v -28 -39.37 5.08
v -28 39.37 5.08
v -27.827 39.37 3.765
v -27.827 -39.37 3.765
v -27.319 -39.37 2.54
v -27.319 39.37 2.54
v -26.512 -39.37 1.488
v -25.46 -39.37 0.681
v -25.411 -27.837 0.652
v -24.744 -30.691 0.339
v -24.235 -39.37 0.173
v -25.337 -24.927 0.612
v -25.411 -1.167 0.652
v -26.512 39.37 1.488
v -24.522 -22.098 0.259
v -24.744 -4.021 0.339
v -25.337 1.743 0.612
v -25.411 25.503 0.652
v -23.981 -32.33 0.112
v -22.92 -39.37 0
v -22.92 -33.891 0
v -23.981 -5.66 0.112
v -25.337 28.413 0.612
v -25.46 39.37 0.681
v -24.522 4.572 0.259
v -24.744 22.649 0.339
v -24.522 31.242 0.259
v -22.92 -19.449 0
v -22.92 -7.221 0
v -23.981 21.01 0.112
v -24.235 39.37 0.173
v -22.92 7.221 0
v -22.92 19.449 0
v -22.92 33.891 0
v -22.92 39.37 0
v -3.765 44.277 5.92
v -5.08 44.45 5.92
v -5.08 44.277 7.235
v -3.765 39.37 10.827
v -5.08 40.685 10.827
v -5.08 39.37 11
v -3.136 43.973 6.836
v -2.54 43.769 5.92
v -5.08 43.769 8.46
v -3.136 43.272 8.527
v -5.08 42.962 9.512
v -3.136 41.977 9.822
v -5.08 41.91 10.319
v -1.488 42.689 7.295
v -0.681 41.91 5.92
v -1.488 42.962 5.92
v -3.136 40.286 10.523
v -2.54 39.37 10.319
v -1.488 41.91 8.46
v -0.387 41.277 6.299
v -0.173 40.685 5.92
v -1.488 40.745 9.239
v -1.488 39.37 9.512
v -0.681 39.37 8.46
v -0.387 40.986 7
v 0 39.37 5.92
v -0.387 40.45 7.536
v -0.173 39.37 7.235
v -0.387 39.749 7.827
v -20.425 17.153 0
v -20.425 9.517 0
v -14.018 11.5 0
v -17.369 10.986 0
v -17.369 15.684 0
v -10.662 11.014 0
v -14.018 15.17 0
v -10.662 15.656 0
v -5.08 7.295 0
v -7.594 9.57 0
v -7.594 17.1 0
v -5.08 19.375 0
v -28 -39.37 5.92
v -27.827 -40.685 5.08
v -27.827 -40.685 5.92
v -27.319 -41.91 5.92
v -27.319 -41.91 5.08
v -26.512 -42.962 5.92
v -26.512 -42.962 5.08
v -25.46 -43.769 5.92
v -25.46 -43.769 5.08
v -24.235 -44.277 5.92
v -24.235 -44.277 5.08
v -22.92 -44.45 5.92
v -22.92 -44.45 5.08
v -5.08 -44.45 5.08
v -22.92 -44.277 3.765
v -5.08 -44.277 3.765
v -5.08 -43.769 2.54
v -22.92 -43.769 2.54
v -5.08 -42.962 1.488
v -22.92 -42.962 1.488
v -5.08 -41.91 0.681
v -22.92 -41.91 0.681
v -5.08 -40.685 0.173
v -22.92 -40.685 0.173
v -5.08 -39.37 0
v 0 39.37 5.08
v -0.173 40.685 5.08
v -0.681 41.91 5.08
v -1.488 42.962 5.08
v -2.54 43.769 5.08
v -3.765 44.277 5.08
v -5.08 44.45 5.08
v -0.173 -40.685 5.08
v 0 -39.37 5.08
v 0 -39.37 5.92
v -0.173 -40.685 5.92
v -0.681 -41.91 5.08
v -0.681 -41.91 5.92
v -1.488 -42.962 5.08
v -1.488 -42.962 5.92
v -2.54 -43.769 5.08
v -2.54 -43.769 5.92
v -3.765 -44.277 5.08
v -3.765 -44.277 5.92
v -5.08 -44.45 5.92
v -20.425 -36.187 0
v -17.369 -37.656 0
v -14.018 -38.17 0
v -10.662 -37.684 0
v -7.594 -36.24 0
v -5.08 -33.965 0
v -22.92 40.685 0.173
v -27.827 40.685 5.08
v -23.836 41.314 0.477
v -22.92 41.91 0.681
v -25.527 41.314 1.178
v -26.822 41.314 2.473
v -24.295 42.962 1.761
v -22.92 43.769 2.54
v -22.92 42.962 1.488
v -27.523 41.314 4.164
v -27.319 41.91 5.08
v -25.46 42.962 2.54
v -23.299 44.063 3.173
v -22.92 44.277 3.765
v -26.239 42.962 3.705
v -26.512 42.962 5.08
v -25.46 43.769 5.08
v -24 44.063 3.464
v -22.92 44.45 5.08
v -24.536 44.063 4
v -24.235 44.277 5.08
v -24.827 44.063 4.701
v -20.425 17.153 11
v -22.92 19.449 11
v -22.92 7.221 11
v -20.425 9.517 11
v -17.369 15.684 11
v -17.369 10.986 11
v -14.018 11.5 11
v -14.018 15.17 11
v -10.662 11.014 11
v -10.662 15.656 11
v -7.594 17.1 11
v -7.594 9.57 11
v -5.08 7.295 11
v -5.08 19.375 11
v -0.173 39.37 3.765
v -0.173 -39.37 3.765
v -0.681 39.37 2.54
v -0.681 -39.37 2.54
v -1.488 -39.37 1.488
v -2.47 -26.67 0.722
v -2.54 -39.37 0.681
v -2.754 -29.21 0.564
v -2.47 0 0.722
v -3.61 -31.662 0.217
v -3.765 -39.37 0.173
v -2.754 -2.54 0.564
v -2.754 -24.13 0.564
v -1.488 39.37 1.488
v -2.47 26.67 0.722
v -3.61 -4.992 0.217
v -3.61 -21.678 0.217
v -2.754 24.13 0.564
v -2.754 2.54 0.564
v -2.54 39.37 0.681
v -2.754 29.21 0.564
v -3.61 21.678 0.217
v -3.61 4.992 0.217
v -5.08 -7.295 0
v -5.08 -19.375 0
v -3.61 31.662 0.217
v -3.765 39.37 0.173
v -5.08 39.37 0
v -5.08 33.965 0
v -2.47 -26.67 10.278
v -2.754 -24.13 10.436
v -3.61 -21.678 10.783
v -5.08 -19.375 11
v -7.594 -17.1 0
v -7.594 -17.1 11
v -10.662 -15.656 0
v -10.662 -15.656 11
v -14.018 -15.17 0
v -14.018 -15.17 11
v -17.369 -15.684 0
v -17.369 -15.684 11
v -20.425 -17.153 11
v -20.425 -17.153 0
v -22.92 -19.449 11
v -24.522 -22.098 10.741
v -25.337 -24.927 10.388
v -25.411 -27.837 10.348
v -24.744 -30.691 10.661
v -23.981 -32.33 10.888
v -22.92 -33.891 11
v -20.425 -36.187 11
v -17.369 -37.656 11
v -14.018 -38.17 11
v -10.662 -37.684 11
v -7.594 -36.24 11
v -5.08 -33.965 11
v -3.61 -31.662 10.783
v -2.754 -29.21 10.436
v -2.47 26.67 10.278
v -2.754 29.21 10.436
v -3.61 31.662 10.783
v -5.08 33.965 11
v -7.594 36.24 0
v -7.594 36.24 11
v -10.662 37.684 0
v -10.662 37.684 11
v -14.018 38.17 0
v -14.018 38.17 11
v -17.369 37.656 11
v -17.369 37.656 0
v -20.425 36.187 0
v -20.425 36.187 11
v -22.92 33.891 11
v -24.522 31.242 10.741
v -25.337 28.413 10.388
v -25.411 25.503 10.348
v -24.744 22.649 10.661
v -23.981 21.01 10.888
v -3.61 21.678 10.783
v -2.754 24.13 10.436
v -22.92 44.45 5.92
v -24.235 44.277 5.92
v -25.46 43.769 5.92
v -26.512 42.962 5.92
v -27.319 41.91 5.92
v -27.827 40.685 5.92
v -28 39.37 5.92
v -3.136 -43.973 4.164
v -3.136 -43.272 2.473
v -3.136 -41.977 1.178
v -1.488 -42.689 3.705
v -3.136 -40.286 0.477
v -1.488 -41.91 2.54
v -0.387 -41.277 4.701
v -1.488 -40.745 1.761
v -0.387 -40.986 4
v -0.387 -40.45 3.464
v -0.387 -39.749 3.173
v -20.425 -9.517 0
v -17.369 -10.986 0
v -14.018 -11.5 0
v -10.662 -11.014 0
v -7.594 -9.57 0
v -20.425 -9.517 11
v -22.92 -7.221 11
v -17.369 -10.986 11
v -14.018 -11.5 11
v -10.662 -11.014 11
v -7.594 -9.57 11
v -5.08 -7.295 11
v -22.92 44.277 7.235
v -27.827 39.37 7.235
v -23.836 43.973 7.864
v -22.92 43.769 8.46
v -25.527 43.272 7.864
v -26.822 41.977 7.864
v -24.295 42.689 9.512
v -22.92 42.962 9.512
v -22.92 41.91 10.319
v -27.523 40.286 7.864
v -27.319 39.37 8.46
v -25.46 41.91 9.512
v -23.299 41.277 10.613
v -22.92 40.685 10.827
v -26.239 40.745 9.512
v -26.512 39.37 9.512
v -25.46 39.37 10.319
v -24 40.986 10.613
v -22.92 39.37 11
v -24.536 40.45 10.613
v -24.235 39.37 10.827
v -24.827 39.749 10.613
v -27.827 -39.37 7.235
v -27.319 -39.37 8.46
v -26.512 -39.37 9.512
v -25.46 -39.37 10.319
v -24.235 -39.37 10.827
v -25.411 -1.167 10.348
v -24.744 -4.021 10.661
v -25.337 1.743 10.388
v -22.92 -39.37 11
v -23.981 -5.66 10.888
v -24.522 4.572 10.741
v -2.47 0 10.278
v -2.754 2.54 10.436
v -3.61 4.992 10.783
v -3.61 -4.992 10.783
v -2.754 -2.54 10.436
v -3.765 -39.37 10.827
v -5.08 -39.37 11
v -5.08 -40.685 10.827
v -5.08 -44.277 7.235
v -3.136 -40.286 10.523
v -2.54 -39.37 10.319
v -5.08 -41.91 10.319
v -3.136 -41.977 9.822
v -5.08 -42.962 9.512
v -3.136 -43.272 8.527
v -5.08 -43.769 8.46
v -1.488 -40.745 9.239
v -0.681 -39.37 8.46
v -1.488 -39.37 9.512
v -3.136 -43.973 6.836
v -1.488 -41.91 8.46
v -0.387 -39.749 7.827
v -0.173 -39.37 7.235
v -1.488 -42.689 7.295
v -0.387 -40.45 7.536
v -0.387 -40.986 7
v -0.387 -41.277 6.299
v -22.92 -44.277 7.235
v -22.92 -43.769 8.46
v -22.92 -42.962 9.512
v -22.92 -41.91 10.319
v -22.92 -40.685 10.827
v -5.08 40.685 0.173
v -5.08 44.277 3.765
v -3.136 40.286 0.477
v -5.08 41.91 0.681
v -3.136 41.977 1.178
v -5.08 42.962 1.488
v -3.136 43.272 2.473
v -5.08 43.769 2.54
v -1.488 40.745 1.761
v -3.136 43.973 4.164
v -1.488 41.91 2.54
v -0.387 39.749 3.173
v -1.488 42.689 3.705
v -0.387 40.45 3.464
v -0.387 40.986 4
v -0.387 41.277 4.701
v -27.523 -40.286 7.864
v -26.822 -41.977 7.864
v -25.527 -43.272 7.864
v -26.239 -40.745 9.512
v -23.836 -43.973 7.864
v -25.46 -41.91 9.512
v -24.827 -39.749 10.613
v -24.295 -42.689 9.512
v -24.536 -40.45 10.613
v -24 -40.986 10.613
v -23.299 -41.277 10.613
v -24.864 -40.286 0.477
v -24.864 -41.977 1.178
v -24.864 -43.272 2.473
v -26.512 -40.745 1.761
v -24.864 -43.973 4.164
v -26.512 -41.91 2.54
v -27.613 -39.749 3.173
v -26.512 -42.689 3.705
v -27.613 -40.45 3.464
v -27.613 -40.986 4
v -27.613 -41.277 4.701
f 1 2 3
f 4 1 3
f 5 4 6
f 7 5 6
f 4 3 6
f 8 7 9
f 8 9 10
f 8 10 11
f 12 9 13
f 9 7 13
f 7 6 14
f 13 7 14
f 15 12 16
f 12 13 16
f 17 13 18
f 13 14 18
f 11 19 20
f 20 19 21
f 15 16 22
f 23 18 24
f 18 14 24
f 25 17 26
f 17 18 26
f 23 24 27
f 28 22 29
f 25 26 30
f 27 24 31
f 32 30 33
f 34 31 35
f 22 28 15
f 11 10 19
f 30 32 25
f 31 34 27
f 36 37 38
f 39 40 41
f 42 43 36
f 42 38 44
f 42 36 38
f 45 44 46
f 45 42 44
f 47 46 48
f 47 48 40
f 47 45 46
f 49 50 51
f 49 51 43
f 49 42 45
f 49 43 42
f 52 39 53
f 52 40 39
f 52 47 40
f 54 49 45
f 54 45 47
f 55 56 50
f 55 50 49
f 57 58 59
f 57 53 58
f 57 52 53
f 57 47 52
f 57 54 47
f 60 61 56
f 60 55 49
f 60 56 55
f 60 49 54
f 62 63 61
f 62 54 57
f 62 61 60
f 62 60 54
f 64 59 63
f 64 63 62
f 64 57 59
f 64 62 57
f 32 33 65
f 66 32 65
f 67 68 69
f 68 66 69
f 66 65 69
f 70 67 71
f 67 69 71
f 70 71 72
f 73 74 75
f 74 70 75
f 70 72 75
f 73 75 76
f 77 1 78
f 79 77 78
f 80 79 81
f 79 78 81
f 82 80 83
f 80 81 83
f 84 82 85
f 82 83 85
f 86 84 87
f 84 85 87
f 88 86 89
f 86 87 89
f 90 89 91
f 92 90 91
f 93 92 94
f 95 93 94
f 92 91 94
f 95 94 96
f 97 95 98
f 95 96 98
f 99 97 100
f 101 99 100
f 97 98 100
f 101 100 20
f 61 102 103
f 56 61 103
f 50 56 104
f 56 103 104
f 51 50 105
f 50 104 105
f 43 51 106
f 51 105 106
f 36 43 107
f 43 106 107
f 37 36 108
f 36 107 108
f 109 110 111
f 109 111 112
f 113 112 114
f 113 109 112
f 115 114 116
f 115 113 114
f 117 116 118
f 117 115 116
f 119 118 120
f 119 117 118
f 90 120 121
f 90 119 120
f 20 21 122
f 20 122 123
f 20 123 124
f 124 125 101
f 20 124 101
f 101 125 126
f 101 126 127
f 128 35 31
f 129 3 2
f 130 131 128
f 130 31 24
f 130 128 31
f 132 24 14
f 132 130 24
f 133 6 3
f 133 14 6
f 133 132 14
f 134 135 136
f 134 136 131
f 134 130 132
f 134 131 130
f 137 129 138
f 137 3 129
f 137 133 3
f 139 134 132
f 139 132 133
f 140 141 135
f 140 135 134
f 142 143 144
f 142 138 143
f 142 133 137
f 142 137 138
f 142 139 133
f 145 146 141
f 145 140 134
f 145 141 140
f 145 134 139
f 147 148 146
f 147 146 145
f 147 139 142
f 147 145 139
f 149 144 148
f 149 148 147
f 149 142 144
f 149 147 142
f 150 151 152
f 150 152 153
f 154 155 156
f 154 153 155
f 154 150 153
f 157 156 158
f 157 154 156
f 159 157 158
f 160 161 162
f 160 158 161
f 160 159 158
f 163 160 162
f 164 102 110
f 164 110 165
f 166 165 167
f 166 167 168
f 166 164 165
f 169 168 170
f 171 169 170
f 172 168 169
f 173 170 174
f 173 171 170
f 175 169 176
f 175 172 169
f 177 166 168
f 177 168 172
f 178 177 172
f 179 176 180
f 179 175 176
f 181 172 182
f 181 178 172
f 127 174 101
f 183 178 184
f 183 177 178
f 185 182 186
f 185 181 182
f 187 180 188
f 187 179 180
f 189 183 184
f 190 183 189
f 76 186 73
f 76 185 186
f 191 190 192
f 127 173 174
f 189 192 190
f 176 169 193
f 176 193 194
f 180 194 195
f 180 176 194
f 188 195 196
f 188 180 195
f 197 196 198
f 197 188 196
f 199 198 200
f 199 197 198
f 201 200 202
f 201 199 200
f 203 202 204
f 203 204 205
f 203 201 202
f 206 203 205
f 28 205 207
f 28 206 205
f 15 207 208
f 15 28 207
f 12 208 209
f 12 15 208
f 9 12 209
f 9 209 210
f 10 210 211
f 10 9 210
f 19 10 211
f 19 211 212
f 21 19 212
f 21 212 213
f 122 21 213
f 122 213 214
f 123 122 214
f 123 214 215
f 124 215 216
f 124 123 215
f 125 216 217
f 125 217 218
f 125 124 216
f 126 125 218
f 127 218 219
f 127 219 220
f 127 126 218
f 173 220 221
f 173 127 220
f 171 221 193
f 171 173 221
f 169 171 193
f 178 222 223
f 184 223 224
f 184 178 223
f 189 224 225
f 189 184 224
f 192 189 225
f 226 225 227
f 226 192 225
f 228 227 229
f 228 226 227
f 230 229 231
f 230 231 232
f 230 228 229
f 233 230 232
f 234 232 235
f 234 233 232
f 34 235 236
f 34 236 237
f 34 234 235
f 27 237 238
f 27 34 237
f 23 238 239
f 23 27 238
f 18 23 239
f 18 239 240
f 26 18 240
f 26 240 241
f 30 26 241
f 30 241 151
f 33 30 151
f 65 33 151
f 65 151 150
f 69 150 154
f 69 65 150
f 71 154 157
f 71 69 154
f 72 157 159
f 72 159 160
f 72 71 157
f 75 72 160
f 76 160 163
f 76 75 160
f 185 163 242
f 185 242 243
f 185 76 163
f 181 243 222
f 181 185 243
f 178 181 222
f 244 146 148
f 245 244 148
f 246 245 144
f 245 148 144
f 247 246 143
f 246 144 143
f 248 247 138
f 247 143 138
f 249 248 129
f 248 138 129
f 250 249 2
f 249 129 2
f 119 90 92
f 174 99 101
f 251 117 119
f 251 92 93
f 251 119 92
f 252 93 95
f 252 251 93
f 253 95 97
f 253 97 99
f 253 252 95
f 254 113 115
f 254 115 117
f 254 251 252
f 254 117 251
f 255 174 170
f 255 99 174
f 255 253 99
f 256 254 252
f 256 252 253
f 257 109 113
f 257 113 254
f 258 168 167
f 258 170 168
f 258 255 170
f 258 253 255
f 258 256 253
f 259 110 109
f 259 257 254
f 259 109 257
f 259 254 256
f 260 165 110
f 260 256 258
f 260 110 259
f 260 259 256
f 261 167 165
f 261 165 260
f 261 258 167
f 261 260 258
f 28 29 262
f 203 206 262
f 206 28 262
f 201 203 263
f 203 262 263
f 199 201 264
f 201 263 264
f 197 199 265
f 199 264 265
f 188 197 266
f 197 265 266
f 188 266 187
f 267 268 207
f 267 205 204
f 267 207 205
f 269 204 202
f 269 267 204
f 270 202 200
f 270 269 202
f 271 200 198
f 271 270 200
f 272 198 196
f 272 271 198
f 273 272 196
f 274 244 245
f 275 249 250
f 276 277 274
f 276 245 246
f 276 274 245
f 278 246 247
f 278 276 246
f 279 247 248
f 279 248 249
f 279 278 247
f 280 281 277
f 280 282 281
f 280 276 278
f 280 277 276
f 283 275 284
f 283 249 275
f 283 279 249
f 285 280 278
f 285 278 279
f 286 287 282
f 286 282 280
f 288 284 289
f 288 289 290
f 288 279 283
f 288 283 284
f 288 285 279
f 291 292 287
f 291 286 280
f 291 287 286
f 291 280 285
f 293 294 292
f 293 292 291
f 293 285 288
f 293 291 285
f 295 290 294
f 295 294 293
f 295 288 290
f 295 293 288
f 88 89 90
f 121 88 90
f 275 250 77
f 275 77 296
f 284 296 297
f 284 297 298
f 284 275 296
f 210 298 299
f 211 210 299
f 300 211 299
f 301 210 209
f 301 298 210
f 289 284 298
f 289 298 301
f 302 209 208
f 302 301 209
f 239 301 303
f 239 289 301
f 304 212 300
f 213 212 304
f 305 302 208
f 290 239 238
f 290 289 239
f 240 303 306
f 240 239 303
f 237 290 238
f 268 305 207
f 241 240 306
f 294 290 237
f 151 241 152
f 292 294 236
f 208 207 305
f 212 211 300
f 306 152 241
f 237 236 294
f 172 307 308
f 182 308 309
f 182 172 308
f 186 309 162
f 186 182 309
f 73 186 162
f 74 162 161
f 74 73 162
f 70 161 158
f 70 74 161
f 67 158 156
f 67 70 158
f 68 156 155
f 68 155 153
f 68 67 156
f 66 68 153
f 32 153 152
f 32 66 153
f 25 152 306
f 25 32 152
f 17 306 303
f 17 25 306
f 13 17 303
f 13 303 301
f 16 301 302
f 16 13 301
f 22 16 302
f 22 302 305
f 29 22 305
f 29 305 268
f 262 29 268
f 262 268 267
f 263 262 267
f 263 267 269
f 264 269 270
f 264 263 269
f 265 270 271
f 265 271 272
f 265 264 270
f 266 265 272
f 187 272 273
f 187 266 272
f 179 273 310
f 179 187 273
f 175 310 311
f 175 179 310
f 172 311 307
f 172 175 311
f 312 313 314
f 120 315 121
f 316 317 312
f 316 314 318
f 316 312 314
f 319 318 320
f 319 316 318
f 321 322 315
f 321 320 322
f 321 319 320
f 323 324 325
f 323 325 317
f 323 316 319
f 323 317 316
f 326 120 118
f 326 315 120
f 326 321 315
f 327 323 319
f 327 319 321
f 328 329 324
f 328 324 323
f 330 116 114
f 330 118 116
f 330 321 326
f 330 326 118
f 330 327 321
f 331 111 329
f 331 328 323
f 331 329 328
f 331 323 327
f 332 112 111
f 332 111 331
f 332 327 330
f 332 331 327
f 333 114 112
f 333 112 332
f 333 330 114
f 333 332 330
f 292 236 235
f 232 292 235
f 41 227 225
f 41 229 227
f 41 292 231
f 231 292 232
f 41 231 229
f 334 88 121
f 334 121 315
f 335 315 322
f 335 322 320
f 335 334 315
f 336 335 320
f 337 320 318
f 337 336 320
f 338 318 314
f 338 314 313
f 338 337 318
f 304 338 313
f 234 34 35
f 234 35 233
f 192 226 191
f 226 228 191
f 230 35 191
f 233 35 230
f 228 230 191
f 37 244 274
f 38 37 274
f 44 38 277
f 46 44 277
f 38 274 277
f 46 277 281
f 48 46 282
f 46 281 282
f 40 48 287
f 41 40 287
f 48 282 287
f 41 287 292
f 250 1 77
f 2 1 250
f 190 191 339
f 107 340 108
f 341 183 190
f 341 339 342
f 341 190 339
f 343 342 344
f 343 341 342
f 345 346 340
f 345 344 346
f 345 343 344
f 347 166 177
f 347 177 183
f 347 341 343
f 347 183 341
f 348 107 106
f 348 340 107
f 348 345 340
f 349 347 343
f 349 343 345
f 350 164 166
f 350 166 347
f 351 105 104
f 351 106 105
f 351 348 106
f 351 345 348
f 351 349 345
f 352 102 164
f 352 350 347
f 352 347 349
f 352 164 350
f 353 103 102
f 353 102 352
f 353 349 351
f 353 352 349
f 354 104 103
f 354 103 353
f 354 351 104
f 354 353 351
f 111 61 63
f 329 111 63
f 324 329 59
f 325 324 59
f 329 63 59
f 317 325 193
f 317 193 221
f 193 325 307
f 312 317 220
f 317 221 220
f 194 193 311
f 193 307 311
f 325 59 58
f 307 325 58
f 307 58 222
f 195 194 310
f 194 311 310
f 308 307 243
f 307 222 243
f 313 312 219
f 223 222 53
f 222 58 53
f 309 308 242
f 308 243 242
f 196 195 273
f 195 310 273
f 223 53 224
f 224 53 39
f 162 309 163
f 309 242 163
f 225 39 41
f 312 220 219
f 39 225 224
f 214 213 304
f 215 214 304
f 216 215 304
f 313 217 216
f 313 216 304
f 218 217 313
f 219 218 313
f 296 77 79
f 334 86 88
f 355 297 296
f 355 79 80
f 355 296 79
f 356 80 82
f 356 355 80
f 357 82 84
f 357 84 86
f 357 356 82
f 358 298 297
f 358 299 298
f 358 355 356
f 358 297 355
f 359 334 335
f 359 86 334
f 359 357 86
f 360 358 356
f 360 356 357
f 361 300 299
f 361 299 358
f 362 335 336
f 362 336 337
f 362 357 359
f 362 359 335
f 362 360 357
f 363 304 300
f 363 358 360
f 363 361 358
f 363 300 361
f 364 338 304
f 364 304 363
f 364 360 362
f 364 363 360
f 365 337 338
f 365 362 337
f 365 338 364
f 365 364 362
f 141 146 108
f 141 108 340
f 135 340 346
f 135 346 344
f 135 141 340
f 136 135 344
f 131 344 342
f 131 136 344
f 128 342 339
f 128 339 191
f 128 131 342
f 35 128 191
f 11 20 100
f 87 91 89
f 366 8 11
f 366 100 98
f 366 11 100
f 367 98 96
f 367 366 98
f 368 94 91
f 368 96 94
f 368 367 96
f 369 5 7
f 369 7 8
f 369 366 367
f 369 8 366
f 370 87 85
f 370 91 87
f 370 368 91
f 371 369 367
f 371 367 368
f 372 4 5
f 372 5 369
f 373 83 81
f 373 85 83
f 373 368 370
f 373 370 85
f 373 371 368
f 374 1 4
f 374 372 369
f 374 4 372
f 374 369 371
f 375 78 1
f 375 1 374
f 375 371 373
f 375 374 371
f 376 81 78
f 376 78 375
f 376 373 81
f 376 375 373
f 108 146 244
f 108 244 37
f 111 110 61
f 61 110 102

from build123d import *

# Parameters (mm, degrees)
F0_W         = 28
F0_H         = 88.9
F0_R         = 11.5
F1_DEPTH     = 11
F2_T1_DEPTH  = 78.74
F2_T3_DEPTH  = 17.84
F2_T5_DEPTH  = 0.84
F2_S9_W      = 5.08
F2_S9_H      = 5.08
F2_T10_DEPTH = 5.08
F2_S15_W     = 5.08
F2_S15_H     = 5.08
F2_T16_DEPTH = 5.08
F2_S21_W     = 5.08
F2_S21_H     = 5.08
F2_T22_DEPTH = 5.08
F2_S27_W     = 5.08
F2_S27_H     = 5.08
F2_T28_DEPTH = 5.08
F2_S33_W     = 5.08
F2_S33_H     = 5.08
F2_T34_DEPTH = 5.08
F2_S39_W     = 5.08
F2_S39_H     = 5.08
F2_T40_DEPTH = 5.08
F2_S45_W     = 5.08
F2_S45_H     = 5.08
F2_T46_DEPTH = 5.08
F2_S51_W     = 5.08
F2_S51_H     = 5.08
F2_T52_DEPTH = 5.08


# Not quite as in the source:
# - a fillet or chamfer that OpenCascade refuses, or shapes differently, is made with other operations: its cross-section is extruded or revolved along the edge and cut away or added


with BuildPart() as f1:
    # F0 (on Top) → F1 (new body)
    with BuildSketch(Plane.XY):
        with Locations((-14, 0)):
            Rectangle(F0_W, F0_H)
        with Locations((-13.97, -26.67)):
            Circle(F0_R, mode=Mode.SUBTRACT)
        with Locations((-13.97, 0)):
            Circle(F0_R, mode=Mode.SUBTRACT)
        with Locations((-13.97, 26.67)):
            Circle(F0_R, mode=Mode.SUBTRACT)
    extrude(amount=F1_DEPTH)

    # F2: fillet of radius 5.08 on 12 edges, made by hand

    # F2_s2 → F2_t1 (cut)
    with BuildSketch(Plane.XZ.offset(-39.37)):
        with BuildLine():
            ThreePointArc((0, 5.92), (-1.4878975516, 9.5121024484), (-5.08, 11))
            Line((-5.08, 11), (0, 11))
            Line((0, 11), (0, 5.92))
        make_face()
        with BuildLine():
            ThreePointArc((0, 5.08), (-1.4878975516, 1.4878975516), (-5.08, 0))
            Line((-5.08, 0), (0, 0))
            Line((0, 0), (0, 5.08))
        make_face()
        with BuildLine():
            ThreePointArc((-28, 5.92), (-26.5121024484, 9.5121024484), (-22.92, 11))
            Line((-22.92, 11), (-28, 11))
            Line((-28, 11), (-28, 5.92))
        make_face()
        with BuildLine():
            ThreePointArc((-28, 5.08), (-26.5121024484, 1.4878975516), (-22.92, 0))
            Line((-22.92, 0), (-28, 0))
            Line((-28, 0), (-28, 5.08))
        make_face()
    extrude(amount=F2_T1_DEPTH, mode=Mode.SUBTRACT)

    # F2_s4 → F2_t3 (cut)
    with BuildSketch(Plane.YZ.offset(-22.92)):
        with BuildLine():
            ThreePointArc((-44.45, 5.92), (-42.9621024484, 9.5121024484), (-39.37, 11))
            Line((-39.37, 11), (-44.45, 11))
            Line((-44.45, 11), (-44.45, 5.92))
        make_face()
        with BuildLine():
            ThreePointArc((-44.45, 5.08), (-42.9621024484, 1.4878975516), (-39.37, 0))
            Line((-39.37, 0), (-44.45, 0))
            Line((-44.45, 0), (-44.45, 5.08))
        make_face()
        with BuildLine():
            ThreePointArc((44.45, 5.92), (42.9621024484, 9.5121024484), (39.37, 11))
            Line((39.37, 11), (44.45, 11))
            Line((44.45, 11), (44.45, 5.92))
        make_face()
        with BuildLine():
            ThreePointArc((44.45, 5.08), (42.9621024484, 1.4878975516), (39.37, 0))
            Line((39.37, 0), (44.45, 0))
            Line((44.45, 0), (44.45, 5.08))
        make_face()
    extrude(amount=F2_T3_DEPTH, mode=Mode.SUBTRACT)

    # F2_s6 → F2_t5 (cut)
    with BuildSketch(Plane.XY.offset(5.08)):
        with BuildLine():
            ThreePointArc((0, -39.37), (-1.4878975516, -42.9621024484), (-5.08, -44.45))
            Line((-5.08, -44.45), (0, -44.45))
            Line((0, -44.45), (0, -39.37))
        make_face()
        with BuildLine():
            ThreePointArc((-28, -39.37), (-26.5121024484, -42.9621024484), (-22.92, -44.45))
            Line((-22.92, -44.45), (-28, -44.45))
            Line((-28, -44.45), (-28, -39.37))
        make_face()
        with BuildLine():
            ThreePointArc((-22.92, 44.45), (-26.5121024484, 42.9621024484), (-28, 39.37))
            Line((-28, 39.37), (-28, 44.45))
            Line((-28, 44.45), (-22.92, 44.45))
        make_face()
        with BuildLine():
            ThreePointArc((0, 39.37), (-1.4878975516, 42.9621024484), (-5.08, 44.45))
            Line((-5.08, 44.45), (0, 44.45))
            Line((0, 44.45), (0, 39.37))
        make_face()
    extrude(amount=F2_T5_DEPTH, mode=Mode.SUBTRACT)


with BuildPart() as f2_tool8:
    # F2_s9 → F2_t10 (new body)
    with BuildSketch(Plane.YZ.offset(-5.08)):
        with Locations((-41.91, 8.46)):
            Rectangle(F2_S9_W, F2_S9_H)
    extrude(amount=F2_T10_DEPTH)

    # F2_s11 → F2_t12 (revolve, cut)
    with BuildSketch(Plane(origin=(-5.08, -39.37, 5.92), x_dir=(0, 0.7071067812, -0.7071067812), z_dir=(0, -0.7071067812, -0.7071067812))):
        with BuildLine():
            ThreePointArc((0, -5.08), (5.08, 0), (0, 5.08))
            Line((0, 5.08), (0, -5.08))
        make_face()
    revolve(axis=Axis((-5.08, -39.37, 5.92), (1, 0, 0)), mode=Mode.SUBTRACT)


with BuildPart() as f1_1:
    add(f1.part)

    # F2_t7: cut F2_tool8
    add(f2_tool8.part, mode=Mode.SUBTRACT)


with BuildPart() as f2_tool14:
    # F2_s15 → F2_t16 (new body)
    with BuildSketch(Plane.YZ.offset(-5.08)):
        with Locations((41.91, 8.46)):
            Rectangle(F2_S15_W, F2_S15_H)
    extrude(amount=F2_T16_DEPTH)

    # F2_s17 → F2_t18 (revolve, cut)
    with BuildSketch(Plane(origin=(-5.08, 39.37, 5.92), x_dir=(0, -0.7071067812, -0.7071067812), z_dir=(0, -0.7071067812, 0.7071067812))):
        with BuildLine():
            ThreePointArc((0, -5.08), (5.08, 0), (0, 5.08))
            Line((0, 5.08), (0, -5.08))
        make_face()
    revolve(axis=Axis((-5.08, 39.37, 5.92), (1, 0, 0)), mode=Mode.SUBTRACT)


with BuildPart() as f1_2:
    add(f1_1.part)

    # F2_t13: cut F2_tool14
    add(f2_tool14.part, mode=Mode.SUBTRACT)


with BuildPart() as f2_tool20:
    # F2_s21 → F2_t22 (new body)
    with BuildSketch(Plane.XY.offset(5.92)):
        with Locations((-25.46, -41.91)):
            Rectangle(F2_S21_W, F2_S21_H)
    extrude(amount=F2_T22_DEPTH)

    # F2_s23 → F2_t24 (revolve, cut)
    with BuildSketch(Plane(origin=(-22.92, -39.37, 5.92), x_dir=(0.7071067812, 0.7071067812, 0), z_dir=(0.7071067812, -0.7071067812, 0))):
        with BuildLine():
            ThreePointArc((0, -5.08), (5.08, 0), (0, 5.08))
            Line((0, 5.08), (0, -5.08))
        make_face()
    revolve(axis=Axis((-22.92, -39.37, 5.92), (0, 0, 1)), mode=Mode.SUBTRACT)


with BuildPart() as f1_3:
    add(f1_2.part)

    # F2_t19: cut F2_tool20
    add(f2_tool20.part, mode=Mode.SUBTRACT)


with BuildPart() as f2_tool26:
    # F2_s27 → F2_t28 (new body)
    with BuildSketch(Plane.YZ.offset(-22.92)):
        with Locations((-41.91, 2.54)):
            Rectangle(F2_S27_W, F2_S27_H)
    extrude(amount=-F2_T28_DEPTH)

    # F2_s29 → F2_t30 (revolve, cut)
    with BuildSketch(Plane(origin=(-22.92, -39.37, 5.08), x_dir=(0, 0.7071067812, 0.7071067812), z_dir=(0, -0.7071067812, 0.7071067812))):
        with BuildLine():
            ThreePointArc((0, -5.08), (5.08, 0), (0, 5.08))
            Line((0, 5.08), (0, -5.08))
        make_face()
    revolve(axis=Axis((-22.92, -39.37, 5.08), (-1, 0, 0)), mode=Mode.SUBTRACT)


with BuildPart() as f1_4:
    add(f1_3.part)

    # F2_t25: cut F2_tool26
    add(f2_tool26.part, mode=Mode.SUBTRACT)


with BuildPart() as f2_tool32:
    # F2_s33 → F2_t34 (new body)
    with BuildSketch(Plane.YZ.offset(-5.08)):
        with Locations((-41.91, 2.54)):
            Rectangle(F2_S33_W, F2_S33_H)
    extrude(amount=F2_T34_DEPTH)

    # F2_s35 → F2_t36 (revolve, cut)
    with BuildSketch(Plane(origin=(-5.08, -39.37, 5.08), x_dir=(0, 0.7071067812, 0.7071067812), z_dir=(0, 0.7071067812, -0.7071067812))):
        with BuildLine():
            ThreePointArc((0, -5.08), (5.08, 0), (0, 5.08))
            Line((0, 5.08), (0, -5.08))
        make_face()
    revolve(axis=Axis((-5.08, -39.37, 5.08), (1, 0, 0)), mode=Mode.SUBTRACT)


with BuildPart() as f1_5:
    add(f1_4.part)

    # F2_t31: cut F2_tool32
    add(f2_tool32.part, mode=Mode.SUBTRACT)


with BuildPart() as f2_tool38:
    # F2_s39 → F2_t40 (new body)
    with BuildSketch(Plane.YZ.offset(-5.08)):
        with Locations((41.91, 2.54)):
            Rectangle(F2_S39_W, F2_S39_H)
    extrude(amount=F2_T40_DEPTH)

    # F2_s41 → F2_t42 (revolve, cut)
    with BuildSketch(Plane(origin=(-5.08, 39.37, 5.08), x_dir=(0, -0.7071067812, 0.7071067812), z_dir=(0, 0.7071067812, 0.7071067812))):
        with BuildLine():
            ThreePointArc((0, -5.08), (5.08, 0), (0, 5.08))
            Line((0, 5.08), (0, -5.08))
        make_face()
    revolve(axis=Axis((-5.08, 39.37, 5.08), (1, 0, 0)), mode=Mode.SUBTRACT)


with BuildPart() as f1_6:
    add(f1_5.part)

    # F2_t37: cut F2_tool38
    add(f2_tool38.part, mode=Mode.SUBTRACT)


with BuildPart() as f2_tool44:
    # F2_s45 → F2_t46 (new body)
    with BuildSketch(Plane.XY.offset(5.92)):
        with Locations((-25.46, 41.91)):
            Rectangle(F2_S45_W, F2_S45_H)
    extrude(amount=F2_T46_DEPTH)

    # F2_s47 → F2_t48 (revolve, cut)
    with BuildSketch(Plane(origin=(-22.92, 39.37, 5.92), x_dir=(0.7071067812, -0.7071067812, 0), z_dir=(-0.7071067812, -0.7071067812, 0))):
        with BuildLine():
            ThreePointArc((0, -5.08), (5.08, 0), (0, 5.08))
            Line((0, 5.08), (0, -5.08))
        make_face()
    revolve(axis=Axis((-22.92, 39.37, 5.92), (0, 0, 1)), mode=Mode.SUBTRACT)


with BuildPart() as f1_7:
    add(f1_6.part)

    # F2_t43: cut F2_tool44
    add(f2_tool44.part, mode=Mode.SUBTRACT)


with BuildPart() as f2_tool50:
    # F2_s51 → F2_t52 (new body)
    with BuildSketch(Plane.XZ.offset(-39.37)):
        with Locations((-25.46, 2.54)):
            Rectangle(F2_S51_W, F2_S51_H)
    extrude(amount=-F2_T52_DEPTH)

    # F2_s53 → F2_t54 (revolve, cut)
    with BuildSketch(Plane(origin=(-22.92, 39.37, 5.08), x_dir=(0.7071067812, 0, 0.7071067812), z_dir=(-0.7071067812, 0, 0.7071067812))):
        with BuildLine():
            ThreePointArc((0, -5.08), (5.08, 0), (0, 5.08))
            Line((0, 5.08), (0, -5.08))
        make_face()
    revolve(axis=Axis((-22.92, 39.37, 5.08), (0, 1, 0)), mode=Mode.SUBTRACT)


with BuildPart() as f1_8:
    add(f1_7.part)

    # F2_t49: cut F2_tool50
    add(f2_tool50.part, mode=Mode.SUBTRACT)


solid = f1_8.part
